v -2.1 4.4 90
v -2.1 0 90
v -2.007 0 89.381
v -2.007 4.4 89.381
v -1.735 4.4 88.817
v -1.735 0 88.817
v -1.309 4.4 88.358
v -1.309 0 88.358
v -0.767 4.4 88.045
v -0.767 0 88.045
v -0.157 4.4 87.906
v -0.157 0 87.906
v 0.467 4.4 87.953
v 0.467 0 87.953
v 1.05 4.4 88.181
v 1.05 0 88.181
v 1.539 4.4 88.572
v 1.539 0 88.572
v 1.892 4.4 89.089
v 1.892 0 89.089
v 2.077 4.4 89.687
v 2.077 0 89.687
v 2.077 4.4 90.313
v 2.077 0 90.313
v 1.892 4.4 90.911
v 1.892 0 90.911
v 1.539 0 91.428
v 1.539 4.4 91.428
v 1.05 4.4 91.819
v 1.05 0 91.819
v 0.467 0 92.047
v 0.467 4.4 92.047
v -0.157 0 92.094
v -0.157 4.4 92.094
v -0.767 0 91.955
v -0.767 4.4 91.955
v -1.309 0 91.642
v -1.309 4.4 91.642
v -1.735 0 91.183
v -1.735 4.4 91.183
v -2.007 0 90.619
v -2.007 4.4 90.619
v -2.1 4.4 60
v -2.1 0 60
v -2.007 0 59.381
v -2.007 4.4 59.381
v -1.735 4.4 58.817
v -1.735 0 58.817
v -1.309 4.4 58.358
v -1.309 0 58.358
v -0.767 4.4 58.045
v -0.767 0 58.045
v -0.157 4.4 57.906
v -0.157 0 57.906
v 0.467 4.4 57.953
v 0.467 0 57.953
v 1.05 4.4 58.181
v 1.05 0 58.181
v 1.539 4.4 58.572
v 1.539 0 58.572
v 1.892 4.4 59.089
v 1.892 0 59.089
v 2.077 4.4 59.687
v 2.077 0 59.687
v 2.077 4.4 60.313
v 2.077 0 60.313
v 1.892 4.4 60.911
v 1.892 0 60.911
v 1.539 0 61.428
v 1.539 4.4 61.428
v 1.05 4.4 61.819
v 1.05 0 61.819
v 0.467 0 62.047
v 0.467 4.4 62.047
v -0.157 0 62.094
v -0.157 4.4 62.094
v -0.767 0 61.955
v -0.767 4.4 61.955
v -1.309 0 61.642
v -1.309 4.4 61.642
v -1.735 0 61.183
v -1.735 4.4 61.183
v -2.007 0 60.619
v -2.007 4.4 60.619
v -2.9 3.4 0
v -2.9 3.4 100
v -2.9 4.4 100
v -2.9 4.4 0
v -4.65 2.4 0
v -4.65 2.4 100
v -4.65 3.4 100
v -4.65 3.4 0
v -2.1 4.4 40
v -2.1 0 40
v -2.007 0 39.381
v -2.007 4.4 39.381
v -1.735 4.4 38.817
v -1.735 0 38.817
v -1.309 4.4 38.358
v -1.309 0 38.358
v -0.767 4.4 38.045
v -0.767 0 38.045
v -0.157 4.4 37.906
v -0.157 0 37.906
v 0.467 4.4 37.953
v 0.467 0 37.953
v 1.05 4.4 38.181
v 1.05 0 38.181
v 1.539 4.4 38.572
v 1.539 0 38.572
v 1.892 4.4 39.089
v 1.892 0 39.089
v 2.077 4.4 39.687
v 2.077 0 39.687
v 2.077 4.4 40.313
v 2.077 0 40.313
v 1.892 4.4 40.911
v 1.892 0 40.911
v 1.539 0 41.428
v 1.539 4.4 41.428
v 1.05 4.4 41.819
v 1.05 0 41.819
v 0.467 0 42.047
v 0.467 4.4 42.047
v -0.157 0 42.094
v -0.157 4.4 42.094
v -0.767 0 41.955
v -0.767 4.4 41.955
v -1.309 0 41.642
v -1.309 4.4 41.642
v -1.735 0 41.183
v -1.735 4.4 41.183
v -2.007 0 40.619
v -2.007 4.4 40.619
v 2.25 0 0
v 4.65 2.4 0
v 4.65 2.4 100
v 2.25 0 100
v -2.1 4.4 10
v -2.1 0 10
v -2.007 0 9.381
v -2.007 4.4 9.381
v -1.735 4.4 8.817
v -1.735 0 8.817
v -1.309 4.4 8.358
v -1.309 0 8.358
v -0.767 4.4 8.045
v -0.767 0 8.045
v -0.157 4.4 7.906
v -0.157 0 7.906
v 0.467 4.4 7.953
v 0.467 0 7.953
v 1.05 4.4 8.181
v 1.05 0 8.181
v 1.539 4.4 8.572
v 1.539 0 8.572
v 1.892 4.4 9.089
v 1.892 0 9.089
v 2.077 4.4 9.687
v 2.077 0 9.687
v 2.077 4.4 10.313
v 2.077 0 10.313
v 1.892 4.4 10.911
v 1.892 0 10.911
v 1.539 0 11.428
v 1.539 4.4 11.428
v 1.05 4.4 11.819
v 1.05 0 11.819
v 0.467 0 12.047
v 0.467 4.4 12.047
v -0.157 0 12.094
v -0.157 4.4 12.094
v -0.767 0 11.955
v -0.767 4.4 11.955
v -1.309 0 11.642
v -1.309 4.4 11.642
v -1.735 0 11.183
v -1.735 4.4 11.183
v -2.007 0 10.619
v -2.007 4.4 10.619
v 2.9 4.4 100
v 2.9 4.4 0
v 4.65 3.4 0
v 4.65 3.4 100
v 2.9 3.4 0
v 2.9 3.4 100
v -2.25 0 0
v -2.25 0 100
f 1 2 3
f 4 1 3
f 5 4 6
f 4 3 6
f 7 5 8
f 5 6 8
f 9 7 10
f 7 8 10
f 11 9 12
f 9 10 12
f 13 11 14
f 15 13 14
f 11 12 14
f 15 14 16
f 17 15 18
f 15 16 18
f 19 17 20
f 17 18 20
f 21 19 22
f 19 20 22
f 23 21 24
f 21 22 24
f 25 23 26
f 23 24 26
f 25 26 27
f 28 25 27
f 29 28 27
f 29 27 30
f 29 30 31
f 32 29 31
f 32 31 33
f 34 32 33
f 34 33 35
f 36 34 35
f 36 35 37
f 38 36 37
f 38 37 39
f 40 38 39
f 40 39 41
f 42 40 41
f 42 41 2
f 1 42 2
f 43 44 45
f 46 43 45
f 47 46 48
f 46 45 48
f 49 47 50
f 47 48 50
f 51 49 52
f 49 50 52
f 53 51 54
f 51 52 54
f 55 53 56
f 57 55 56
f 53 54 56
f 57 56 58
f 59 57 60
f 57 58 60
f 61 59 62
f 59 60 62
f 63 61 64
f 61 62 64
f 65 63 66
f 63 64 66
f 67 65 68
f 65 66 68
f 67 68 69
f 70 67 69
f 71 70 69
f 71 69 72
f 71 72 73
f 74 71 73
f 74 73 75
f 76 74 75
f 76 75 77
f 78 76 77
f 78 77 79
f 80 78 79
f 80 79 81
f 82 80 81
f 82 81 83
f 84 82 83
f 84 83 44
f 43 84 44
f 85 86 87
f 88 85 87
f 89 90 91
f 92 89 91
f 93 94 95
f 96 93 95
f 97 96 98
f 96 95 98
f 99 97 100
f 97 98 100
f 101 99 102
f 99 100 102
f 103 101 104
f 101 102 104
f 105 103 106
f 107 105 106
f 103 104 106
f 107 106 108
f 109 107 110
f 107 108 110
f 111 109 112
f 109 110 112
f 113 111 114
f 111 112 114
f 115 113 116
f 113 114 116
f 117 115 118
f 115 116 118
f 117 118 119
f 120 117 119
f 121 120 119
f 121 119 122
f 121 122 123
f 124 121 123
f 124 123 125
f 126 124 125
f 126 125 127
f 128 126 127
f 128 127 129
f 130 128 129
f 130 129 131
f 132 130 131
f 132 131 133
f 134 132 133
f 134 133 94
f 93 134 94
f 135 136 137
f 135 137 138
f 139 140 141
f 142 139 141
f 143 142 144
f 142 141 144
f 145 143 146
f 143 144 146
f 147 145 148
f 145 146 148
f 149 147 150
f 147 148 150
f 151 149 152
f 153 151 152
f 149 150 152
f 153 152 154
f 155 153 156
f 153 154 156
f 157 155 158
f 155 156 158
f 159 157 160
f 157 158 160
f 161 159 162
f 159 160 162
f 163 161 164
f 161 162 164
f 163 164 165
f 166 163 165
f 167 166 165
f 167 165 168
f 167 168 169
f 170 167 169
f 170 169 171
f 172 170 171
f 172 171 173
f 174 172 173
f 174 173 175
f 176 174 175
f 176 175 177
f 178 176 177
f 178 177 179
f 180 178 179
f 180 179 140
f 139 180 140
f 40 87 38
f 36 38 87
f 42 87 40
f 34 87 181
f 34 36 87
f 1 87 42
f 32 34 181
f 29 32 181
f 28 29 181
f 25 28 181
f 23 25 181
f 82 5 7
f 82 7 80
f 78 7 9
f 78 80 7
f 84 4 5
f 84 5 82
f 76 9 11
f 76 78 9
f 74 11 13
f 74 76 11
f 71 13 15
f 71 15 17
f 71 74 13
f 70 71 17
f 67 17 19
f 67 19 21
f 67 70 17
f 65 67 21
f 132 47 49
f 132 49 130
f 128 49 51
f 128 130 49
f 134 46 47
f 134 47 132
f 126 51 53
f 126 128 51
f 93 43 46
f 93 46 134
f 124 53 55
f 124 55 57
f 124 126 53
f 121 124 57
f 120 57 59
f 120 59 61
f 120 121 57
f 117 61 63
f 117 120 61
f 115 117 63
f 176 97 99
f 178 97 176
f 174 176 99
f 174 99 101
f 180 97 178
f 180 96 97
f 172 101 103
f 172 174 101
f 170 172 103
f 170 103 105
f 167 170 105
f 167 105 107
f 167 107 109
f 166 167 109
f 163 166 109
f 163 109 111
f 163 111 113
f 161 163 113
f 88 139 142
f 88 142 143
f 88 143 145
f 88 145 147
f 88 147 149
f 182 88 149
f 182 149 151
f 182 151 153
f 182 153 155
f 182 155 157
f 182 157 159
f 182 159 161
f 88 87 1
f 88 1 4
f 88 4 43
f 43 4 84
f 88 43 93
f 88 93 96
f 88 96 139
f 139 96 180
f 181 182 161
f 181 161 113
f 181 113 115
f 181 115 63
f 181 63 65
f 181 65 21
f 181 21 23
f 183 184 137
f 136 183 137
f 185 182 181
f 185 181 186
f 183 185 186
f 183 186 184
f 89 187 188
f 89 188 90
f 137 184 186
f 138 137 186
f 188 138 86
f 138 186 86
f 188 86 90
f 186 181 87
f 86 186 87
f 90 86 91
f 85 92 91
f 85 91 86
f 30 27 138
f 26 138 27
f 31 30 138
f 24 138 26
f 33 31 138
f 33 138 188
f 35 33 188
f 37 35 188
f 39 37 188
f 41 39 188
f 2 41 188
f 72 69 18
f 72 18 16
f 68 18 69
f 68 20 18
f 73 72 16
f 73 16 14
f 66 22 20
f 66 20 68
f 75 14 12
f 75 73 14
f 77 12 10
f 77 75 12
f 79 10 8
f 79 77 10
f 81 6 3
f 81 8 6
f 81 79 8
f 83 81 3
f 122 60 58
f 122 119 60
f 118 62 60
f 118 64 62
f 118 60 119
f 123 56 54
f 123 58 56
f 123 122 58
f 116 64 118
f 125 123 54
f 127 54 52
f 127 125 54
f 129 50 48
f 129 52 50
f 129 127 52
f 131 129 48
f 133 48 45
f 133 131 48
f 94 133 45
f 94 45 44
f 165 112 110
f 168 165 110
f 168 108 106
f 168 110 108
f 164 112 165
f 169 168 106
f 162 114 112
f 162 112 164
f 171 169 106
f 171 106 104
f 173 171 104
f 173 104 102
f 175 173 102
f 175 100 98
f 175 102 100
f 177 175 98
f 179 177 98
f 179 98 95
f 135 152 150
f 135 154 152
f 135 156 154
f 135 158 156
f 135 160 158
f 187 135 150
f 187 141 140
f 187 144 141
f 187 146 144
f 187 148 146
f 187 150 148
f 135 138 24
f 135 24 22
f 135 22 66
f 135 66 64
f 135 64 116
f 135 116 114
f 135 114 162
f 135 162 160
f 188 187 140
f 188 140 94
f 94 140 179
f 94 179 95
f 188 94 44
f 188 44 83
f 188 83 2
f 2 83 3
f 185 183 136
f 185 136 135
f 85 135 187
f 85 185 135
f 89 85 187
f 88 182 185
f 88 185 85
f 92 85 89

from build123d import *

# Parameters (mm, degrees)
BOSS_EXTRUDE1_DEPTH   = 100
M5X0_8_TAPPED_HOLE1_D = 4.2


with BuildPart() as part:
    # Sketch1 → Boss-Extrude1 (new body)
    with BuildSketch(Plane.XY):
        Polygon((2.25, 0), (-2.25, 0), (-4.65, 2.4), (-4.65, 3.4), (-2.9, 3.4), (-2.9, 4.4), (2.9, 4.4), (2.9, 3.4), (4.65, 3.4), (4.65, 2.4), align=None)
    extrude(amount=BOSS_EXTRUDE1_DEPTH)

    # M5x0.8 Tapped Hole1 (through all)
    with Locations(Plane(origin=(0, 4.4, 0), x_dir=(1, 0, 0), z_dir=(0, 1, 0))):
        with Locations((0, -10), (0, -40), (0, -60), (0, -90)):
            Hole(M5X0_8_TAPPED_HOLE1_D / 2)


solid = part.part
